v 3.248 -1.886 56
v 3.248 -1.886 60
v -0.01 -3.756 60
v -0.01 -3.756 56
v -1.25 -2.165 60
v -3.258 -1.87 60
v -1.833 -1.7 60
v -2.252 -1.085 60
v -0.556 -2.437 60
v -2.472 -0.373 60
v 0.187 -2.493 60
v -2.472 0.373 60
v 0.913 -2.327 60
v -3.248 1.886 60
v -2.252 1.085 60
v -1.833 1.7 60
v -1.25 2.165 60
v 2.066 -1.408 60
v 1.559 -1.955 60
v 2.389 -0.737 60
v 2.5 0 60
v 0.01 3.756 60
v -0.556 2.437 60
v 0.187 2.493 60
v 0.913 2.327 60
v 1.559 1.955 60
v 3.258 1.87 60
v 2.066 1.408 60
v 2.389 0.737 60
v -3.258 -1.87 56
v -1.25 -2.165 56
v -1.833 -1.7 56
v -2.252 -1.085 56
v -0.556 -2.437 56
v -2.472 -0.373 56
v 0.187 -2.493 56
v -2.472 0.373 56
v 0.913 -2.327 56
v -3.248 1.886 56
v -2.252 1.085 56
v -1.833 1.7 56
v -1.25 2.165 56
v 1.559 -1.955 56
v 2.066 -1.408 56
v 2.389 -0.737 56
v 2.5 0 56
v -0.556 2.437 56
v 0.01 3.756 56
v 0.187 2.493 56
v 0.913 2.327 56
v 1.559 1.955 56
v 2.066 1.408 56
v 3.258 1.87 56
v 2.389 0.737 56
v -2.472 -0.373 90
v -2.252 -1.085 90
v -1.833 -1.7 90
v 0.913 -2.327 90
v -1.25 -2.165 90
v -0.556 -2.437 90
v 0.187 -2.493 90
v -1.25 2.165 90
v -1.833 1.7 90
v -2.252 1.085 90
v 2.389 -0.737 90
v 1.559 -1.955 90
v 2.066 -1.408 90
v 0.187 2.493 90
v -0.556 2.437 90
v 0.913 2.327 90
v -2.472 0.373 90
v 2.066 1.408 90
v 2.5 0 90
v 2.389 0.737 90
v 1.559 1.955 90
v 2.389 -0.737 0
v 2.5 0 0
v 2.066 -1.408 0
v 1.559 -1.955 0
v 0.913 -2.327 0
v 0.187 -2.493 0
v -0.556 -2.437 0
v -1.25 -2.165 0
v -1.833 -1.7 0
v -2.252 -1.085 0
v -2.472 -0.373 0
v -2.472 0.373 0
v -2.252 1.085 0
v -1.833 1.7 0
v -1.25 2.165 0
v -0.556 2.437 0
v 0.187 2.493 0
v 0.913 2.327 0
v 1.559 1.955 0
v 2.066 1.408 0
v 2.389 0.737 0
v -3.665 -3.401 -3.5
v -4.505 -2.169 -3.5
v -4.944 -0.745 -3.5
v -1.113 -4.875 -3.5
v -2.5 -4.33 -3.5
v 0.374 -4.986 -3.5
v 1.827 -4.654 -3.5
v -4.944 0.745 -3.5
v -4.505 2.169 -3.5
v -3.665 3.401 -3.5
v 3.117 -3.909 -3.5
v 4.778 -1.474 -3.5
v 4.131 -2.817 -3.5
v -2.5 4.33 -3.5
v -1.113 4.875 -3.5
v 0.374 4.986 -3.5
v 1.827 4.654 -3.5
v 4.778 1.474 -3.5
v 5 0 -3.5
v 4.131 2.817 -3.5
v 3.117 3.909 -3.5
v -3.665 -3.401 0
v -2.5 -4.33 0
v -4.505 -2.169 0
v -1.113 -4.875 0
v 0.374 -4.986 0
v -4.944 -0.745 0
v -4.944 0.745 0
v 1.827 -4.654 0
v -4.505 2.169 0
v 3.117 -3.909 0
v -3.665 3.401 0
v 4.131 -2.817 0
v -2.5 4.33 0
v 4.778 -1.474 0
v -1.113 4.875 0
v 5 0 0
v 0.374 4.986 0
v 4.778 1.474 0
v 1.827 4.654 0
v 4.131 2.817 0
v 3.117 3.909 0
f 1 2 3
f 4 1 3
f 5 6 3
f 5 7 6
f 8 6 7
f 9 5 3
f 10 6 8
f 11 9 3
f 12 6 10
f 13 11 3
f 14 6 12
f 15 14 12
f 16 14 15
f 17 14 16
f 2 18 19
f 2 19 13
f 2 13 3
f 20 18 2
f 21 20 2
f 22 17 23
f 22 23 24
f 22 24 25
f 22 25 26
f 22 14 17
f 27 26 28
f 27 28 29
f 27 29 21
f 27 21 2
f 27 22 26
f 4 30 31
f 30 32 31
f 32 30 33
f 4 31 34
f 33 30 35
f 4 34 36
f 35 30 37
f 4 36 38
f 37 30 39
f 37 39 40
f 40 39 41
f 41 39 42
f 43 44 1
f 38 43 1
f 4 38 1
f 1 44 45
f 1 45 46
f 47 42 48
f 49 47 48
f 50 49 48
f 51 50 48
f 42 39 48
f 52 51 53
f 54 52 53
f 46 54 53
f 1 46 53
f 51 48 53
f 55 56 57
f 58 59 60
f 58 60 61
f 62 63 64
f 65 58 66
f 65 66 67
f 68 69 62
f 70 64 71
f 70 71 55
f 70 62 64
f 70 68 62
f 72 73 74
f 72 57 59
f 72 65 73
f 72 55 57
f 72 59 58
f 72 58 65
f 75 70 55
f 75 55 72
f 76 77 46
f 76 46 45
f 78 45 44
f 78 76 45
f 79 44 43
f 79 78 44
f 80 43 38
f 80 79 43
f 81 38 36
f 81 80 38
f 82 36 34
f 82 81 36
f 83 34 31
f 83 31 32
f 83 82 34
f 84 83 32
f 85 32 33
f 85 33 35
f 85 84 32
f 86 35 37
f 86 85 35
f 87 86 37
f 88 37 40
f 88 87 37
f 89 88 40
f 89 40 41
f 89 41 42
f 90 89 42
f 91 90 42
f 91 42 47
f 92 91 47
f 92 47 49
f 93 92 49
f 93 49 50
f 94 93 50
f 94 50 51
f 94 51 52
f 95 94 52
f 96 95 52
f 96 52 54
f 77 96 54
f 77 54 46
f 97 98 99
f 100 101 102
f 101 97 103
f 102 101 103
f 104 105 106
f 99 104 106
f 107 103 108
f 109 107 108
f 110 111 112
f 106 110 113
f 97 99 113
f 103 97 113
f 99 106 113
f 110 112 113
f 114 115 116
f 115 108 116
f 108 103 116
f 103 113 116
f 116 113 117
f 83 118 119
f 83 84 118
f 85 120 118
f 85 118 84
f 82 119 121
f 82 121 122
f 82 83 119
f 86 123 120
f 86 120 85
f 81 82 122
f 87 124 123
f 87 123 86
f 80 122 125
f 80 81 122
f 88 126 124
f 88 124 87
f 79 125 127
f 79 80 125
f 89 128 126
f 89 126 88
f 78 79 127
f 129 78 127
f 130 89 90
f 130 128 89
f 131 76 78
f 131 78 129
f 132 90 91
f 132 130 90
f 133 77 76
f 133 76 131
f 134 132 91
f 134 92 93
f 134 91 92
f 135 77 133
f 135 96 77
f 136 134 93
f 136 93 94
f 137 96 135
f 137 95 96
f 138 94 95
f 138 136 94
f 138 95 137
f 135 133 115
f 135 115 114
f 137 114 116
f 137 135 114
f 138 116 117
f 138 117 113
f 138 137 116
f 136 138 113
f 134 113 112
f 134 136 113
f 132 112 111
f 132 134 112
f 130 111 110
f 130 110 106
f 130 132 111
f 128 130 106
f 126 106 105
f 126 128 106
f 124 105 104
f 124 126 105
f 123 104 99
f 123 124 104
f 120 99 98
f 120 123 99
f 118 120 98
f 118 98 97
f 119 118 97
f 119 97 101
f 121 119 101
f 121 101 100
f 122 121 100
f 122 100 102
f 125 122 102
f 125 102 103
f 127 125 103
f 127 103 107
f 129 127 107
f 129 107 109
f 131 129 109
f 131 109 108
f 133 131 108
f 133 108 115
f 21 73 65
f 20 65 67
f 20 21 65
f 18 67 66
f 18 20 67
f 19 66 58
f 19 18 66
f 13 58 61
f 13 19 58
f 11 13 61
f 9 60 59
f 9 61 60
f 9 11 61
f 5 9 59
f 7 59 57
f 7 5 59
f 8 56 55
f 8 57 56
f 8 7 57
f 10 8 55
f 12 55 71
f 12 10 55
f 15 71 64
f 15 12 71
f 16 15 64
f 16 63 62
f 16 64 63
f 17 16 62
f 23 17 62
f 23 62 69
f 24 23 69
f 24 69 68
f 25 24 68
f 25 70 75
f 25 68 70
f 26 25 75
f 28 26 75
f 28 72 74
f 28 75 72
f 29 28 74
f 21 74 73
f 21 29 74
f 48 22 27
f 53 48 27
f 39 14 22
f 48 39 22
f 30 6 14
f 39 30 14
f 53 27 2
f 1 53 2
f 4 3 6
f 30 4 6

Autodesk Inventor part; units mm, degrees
ref_plane "YZ Plane" through (0, 0, 0) normal (1, 0, 0) x (0, 1, 0)
ref_plane "XZ Plane" through (0, 0, 0) normal (0, 1, 0) x (-1, 0, 0)
sketch "Sketch1" plane through (0, 0, 0) normal (0, 0, 1) x (1, 0, 0)
  circle A0 centre (0, 0) radius 2.5
  circle A1 centre (0, 0) radius 5
  dimension "d12" = 5
  dimension "d18" = 10
sketch "Sketch3" plane through (0, 0, 0) normal (0, 0, 1) x (1, 0, 0)
  circle A0 centre (0, 0) radius 2.5
  circle A1 centre (0, 0) radius 3.75
  dimension "d14" = 5
  dimension "d15" = 7.5
extrude "Extrusion3" add sketch "Sketch3" along normal blind 90 contours A0
extrude "Extrusion4" add sketch "Sketch1" against normal blind 3.5 contours A0 | A1
thread "Thread2" size "M5x0.8" class "6g" standard "ANSI Metric M Profile" full length
ref_plane "Work Plane1" through (0, 0, 60) normal (0, 0, 1) x (1, 0, 0)
sketch "Sketch4" plane through (0, 0, 60) normal (0, 0, 1) x (1, 0, 0)
  line L0 (-3.2481, 1.8864) -> (0.0096, 3.7562)
  line L1 (0.0096, 3.7562) -> (3.2578, 1.8698)
  line L2 (3.2578, 1.8698) -> (3.2481, -1.8864)
  line L3 (3.2481, -1.8864) -> (-0.0096, -3.7562)
  line L4 (-0.0096, -3.7562) -> (-3.2578, -1.8698)
  line L5 (-3.2578, -1.8698) -> (-3.2481, 1.8864)
  point P0 (0, 0)
  point P1 (0, 0)
extrude "Extrusion5" add sketch "Sketch4" against normal blind 4
properties part number "tornillo M5 largo"
